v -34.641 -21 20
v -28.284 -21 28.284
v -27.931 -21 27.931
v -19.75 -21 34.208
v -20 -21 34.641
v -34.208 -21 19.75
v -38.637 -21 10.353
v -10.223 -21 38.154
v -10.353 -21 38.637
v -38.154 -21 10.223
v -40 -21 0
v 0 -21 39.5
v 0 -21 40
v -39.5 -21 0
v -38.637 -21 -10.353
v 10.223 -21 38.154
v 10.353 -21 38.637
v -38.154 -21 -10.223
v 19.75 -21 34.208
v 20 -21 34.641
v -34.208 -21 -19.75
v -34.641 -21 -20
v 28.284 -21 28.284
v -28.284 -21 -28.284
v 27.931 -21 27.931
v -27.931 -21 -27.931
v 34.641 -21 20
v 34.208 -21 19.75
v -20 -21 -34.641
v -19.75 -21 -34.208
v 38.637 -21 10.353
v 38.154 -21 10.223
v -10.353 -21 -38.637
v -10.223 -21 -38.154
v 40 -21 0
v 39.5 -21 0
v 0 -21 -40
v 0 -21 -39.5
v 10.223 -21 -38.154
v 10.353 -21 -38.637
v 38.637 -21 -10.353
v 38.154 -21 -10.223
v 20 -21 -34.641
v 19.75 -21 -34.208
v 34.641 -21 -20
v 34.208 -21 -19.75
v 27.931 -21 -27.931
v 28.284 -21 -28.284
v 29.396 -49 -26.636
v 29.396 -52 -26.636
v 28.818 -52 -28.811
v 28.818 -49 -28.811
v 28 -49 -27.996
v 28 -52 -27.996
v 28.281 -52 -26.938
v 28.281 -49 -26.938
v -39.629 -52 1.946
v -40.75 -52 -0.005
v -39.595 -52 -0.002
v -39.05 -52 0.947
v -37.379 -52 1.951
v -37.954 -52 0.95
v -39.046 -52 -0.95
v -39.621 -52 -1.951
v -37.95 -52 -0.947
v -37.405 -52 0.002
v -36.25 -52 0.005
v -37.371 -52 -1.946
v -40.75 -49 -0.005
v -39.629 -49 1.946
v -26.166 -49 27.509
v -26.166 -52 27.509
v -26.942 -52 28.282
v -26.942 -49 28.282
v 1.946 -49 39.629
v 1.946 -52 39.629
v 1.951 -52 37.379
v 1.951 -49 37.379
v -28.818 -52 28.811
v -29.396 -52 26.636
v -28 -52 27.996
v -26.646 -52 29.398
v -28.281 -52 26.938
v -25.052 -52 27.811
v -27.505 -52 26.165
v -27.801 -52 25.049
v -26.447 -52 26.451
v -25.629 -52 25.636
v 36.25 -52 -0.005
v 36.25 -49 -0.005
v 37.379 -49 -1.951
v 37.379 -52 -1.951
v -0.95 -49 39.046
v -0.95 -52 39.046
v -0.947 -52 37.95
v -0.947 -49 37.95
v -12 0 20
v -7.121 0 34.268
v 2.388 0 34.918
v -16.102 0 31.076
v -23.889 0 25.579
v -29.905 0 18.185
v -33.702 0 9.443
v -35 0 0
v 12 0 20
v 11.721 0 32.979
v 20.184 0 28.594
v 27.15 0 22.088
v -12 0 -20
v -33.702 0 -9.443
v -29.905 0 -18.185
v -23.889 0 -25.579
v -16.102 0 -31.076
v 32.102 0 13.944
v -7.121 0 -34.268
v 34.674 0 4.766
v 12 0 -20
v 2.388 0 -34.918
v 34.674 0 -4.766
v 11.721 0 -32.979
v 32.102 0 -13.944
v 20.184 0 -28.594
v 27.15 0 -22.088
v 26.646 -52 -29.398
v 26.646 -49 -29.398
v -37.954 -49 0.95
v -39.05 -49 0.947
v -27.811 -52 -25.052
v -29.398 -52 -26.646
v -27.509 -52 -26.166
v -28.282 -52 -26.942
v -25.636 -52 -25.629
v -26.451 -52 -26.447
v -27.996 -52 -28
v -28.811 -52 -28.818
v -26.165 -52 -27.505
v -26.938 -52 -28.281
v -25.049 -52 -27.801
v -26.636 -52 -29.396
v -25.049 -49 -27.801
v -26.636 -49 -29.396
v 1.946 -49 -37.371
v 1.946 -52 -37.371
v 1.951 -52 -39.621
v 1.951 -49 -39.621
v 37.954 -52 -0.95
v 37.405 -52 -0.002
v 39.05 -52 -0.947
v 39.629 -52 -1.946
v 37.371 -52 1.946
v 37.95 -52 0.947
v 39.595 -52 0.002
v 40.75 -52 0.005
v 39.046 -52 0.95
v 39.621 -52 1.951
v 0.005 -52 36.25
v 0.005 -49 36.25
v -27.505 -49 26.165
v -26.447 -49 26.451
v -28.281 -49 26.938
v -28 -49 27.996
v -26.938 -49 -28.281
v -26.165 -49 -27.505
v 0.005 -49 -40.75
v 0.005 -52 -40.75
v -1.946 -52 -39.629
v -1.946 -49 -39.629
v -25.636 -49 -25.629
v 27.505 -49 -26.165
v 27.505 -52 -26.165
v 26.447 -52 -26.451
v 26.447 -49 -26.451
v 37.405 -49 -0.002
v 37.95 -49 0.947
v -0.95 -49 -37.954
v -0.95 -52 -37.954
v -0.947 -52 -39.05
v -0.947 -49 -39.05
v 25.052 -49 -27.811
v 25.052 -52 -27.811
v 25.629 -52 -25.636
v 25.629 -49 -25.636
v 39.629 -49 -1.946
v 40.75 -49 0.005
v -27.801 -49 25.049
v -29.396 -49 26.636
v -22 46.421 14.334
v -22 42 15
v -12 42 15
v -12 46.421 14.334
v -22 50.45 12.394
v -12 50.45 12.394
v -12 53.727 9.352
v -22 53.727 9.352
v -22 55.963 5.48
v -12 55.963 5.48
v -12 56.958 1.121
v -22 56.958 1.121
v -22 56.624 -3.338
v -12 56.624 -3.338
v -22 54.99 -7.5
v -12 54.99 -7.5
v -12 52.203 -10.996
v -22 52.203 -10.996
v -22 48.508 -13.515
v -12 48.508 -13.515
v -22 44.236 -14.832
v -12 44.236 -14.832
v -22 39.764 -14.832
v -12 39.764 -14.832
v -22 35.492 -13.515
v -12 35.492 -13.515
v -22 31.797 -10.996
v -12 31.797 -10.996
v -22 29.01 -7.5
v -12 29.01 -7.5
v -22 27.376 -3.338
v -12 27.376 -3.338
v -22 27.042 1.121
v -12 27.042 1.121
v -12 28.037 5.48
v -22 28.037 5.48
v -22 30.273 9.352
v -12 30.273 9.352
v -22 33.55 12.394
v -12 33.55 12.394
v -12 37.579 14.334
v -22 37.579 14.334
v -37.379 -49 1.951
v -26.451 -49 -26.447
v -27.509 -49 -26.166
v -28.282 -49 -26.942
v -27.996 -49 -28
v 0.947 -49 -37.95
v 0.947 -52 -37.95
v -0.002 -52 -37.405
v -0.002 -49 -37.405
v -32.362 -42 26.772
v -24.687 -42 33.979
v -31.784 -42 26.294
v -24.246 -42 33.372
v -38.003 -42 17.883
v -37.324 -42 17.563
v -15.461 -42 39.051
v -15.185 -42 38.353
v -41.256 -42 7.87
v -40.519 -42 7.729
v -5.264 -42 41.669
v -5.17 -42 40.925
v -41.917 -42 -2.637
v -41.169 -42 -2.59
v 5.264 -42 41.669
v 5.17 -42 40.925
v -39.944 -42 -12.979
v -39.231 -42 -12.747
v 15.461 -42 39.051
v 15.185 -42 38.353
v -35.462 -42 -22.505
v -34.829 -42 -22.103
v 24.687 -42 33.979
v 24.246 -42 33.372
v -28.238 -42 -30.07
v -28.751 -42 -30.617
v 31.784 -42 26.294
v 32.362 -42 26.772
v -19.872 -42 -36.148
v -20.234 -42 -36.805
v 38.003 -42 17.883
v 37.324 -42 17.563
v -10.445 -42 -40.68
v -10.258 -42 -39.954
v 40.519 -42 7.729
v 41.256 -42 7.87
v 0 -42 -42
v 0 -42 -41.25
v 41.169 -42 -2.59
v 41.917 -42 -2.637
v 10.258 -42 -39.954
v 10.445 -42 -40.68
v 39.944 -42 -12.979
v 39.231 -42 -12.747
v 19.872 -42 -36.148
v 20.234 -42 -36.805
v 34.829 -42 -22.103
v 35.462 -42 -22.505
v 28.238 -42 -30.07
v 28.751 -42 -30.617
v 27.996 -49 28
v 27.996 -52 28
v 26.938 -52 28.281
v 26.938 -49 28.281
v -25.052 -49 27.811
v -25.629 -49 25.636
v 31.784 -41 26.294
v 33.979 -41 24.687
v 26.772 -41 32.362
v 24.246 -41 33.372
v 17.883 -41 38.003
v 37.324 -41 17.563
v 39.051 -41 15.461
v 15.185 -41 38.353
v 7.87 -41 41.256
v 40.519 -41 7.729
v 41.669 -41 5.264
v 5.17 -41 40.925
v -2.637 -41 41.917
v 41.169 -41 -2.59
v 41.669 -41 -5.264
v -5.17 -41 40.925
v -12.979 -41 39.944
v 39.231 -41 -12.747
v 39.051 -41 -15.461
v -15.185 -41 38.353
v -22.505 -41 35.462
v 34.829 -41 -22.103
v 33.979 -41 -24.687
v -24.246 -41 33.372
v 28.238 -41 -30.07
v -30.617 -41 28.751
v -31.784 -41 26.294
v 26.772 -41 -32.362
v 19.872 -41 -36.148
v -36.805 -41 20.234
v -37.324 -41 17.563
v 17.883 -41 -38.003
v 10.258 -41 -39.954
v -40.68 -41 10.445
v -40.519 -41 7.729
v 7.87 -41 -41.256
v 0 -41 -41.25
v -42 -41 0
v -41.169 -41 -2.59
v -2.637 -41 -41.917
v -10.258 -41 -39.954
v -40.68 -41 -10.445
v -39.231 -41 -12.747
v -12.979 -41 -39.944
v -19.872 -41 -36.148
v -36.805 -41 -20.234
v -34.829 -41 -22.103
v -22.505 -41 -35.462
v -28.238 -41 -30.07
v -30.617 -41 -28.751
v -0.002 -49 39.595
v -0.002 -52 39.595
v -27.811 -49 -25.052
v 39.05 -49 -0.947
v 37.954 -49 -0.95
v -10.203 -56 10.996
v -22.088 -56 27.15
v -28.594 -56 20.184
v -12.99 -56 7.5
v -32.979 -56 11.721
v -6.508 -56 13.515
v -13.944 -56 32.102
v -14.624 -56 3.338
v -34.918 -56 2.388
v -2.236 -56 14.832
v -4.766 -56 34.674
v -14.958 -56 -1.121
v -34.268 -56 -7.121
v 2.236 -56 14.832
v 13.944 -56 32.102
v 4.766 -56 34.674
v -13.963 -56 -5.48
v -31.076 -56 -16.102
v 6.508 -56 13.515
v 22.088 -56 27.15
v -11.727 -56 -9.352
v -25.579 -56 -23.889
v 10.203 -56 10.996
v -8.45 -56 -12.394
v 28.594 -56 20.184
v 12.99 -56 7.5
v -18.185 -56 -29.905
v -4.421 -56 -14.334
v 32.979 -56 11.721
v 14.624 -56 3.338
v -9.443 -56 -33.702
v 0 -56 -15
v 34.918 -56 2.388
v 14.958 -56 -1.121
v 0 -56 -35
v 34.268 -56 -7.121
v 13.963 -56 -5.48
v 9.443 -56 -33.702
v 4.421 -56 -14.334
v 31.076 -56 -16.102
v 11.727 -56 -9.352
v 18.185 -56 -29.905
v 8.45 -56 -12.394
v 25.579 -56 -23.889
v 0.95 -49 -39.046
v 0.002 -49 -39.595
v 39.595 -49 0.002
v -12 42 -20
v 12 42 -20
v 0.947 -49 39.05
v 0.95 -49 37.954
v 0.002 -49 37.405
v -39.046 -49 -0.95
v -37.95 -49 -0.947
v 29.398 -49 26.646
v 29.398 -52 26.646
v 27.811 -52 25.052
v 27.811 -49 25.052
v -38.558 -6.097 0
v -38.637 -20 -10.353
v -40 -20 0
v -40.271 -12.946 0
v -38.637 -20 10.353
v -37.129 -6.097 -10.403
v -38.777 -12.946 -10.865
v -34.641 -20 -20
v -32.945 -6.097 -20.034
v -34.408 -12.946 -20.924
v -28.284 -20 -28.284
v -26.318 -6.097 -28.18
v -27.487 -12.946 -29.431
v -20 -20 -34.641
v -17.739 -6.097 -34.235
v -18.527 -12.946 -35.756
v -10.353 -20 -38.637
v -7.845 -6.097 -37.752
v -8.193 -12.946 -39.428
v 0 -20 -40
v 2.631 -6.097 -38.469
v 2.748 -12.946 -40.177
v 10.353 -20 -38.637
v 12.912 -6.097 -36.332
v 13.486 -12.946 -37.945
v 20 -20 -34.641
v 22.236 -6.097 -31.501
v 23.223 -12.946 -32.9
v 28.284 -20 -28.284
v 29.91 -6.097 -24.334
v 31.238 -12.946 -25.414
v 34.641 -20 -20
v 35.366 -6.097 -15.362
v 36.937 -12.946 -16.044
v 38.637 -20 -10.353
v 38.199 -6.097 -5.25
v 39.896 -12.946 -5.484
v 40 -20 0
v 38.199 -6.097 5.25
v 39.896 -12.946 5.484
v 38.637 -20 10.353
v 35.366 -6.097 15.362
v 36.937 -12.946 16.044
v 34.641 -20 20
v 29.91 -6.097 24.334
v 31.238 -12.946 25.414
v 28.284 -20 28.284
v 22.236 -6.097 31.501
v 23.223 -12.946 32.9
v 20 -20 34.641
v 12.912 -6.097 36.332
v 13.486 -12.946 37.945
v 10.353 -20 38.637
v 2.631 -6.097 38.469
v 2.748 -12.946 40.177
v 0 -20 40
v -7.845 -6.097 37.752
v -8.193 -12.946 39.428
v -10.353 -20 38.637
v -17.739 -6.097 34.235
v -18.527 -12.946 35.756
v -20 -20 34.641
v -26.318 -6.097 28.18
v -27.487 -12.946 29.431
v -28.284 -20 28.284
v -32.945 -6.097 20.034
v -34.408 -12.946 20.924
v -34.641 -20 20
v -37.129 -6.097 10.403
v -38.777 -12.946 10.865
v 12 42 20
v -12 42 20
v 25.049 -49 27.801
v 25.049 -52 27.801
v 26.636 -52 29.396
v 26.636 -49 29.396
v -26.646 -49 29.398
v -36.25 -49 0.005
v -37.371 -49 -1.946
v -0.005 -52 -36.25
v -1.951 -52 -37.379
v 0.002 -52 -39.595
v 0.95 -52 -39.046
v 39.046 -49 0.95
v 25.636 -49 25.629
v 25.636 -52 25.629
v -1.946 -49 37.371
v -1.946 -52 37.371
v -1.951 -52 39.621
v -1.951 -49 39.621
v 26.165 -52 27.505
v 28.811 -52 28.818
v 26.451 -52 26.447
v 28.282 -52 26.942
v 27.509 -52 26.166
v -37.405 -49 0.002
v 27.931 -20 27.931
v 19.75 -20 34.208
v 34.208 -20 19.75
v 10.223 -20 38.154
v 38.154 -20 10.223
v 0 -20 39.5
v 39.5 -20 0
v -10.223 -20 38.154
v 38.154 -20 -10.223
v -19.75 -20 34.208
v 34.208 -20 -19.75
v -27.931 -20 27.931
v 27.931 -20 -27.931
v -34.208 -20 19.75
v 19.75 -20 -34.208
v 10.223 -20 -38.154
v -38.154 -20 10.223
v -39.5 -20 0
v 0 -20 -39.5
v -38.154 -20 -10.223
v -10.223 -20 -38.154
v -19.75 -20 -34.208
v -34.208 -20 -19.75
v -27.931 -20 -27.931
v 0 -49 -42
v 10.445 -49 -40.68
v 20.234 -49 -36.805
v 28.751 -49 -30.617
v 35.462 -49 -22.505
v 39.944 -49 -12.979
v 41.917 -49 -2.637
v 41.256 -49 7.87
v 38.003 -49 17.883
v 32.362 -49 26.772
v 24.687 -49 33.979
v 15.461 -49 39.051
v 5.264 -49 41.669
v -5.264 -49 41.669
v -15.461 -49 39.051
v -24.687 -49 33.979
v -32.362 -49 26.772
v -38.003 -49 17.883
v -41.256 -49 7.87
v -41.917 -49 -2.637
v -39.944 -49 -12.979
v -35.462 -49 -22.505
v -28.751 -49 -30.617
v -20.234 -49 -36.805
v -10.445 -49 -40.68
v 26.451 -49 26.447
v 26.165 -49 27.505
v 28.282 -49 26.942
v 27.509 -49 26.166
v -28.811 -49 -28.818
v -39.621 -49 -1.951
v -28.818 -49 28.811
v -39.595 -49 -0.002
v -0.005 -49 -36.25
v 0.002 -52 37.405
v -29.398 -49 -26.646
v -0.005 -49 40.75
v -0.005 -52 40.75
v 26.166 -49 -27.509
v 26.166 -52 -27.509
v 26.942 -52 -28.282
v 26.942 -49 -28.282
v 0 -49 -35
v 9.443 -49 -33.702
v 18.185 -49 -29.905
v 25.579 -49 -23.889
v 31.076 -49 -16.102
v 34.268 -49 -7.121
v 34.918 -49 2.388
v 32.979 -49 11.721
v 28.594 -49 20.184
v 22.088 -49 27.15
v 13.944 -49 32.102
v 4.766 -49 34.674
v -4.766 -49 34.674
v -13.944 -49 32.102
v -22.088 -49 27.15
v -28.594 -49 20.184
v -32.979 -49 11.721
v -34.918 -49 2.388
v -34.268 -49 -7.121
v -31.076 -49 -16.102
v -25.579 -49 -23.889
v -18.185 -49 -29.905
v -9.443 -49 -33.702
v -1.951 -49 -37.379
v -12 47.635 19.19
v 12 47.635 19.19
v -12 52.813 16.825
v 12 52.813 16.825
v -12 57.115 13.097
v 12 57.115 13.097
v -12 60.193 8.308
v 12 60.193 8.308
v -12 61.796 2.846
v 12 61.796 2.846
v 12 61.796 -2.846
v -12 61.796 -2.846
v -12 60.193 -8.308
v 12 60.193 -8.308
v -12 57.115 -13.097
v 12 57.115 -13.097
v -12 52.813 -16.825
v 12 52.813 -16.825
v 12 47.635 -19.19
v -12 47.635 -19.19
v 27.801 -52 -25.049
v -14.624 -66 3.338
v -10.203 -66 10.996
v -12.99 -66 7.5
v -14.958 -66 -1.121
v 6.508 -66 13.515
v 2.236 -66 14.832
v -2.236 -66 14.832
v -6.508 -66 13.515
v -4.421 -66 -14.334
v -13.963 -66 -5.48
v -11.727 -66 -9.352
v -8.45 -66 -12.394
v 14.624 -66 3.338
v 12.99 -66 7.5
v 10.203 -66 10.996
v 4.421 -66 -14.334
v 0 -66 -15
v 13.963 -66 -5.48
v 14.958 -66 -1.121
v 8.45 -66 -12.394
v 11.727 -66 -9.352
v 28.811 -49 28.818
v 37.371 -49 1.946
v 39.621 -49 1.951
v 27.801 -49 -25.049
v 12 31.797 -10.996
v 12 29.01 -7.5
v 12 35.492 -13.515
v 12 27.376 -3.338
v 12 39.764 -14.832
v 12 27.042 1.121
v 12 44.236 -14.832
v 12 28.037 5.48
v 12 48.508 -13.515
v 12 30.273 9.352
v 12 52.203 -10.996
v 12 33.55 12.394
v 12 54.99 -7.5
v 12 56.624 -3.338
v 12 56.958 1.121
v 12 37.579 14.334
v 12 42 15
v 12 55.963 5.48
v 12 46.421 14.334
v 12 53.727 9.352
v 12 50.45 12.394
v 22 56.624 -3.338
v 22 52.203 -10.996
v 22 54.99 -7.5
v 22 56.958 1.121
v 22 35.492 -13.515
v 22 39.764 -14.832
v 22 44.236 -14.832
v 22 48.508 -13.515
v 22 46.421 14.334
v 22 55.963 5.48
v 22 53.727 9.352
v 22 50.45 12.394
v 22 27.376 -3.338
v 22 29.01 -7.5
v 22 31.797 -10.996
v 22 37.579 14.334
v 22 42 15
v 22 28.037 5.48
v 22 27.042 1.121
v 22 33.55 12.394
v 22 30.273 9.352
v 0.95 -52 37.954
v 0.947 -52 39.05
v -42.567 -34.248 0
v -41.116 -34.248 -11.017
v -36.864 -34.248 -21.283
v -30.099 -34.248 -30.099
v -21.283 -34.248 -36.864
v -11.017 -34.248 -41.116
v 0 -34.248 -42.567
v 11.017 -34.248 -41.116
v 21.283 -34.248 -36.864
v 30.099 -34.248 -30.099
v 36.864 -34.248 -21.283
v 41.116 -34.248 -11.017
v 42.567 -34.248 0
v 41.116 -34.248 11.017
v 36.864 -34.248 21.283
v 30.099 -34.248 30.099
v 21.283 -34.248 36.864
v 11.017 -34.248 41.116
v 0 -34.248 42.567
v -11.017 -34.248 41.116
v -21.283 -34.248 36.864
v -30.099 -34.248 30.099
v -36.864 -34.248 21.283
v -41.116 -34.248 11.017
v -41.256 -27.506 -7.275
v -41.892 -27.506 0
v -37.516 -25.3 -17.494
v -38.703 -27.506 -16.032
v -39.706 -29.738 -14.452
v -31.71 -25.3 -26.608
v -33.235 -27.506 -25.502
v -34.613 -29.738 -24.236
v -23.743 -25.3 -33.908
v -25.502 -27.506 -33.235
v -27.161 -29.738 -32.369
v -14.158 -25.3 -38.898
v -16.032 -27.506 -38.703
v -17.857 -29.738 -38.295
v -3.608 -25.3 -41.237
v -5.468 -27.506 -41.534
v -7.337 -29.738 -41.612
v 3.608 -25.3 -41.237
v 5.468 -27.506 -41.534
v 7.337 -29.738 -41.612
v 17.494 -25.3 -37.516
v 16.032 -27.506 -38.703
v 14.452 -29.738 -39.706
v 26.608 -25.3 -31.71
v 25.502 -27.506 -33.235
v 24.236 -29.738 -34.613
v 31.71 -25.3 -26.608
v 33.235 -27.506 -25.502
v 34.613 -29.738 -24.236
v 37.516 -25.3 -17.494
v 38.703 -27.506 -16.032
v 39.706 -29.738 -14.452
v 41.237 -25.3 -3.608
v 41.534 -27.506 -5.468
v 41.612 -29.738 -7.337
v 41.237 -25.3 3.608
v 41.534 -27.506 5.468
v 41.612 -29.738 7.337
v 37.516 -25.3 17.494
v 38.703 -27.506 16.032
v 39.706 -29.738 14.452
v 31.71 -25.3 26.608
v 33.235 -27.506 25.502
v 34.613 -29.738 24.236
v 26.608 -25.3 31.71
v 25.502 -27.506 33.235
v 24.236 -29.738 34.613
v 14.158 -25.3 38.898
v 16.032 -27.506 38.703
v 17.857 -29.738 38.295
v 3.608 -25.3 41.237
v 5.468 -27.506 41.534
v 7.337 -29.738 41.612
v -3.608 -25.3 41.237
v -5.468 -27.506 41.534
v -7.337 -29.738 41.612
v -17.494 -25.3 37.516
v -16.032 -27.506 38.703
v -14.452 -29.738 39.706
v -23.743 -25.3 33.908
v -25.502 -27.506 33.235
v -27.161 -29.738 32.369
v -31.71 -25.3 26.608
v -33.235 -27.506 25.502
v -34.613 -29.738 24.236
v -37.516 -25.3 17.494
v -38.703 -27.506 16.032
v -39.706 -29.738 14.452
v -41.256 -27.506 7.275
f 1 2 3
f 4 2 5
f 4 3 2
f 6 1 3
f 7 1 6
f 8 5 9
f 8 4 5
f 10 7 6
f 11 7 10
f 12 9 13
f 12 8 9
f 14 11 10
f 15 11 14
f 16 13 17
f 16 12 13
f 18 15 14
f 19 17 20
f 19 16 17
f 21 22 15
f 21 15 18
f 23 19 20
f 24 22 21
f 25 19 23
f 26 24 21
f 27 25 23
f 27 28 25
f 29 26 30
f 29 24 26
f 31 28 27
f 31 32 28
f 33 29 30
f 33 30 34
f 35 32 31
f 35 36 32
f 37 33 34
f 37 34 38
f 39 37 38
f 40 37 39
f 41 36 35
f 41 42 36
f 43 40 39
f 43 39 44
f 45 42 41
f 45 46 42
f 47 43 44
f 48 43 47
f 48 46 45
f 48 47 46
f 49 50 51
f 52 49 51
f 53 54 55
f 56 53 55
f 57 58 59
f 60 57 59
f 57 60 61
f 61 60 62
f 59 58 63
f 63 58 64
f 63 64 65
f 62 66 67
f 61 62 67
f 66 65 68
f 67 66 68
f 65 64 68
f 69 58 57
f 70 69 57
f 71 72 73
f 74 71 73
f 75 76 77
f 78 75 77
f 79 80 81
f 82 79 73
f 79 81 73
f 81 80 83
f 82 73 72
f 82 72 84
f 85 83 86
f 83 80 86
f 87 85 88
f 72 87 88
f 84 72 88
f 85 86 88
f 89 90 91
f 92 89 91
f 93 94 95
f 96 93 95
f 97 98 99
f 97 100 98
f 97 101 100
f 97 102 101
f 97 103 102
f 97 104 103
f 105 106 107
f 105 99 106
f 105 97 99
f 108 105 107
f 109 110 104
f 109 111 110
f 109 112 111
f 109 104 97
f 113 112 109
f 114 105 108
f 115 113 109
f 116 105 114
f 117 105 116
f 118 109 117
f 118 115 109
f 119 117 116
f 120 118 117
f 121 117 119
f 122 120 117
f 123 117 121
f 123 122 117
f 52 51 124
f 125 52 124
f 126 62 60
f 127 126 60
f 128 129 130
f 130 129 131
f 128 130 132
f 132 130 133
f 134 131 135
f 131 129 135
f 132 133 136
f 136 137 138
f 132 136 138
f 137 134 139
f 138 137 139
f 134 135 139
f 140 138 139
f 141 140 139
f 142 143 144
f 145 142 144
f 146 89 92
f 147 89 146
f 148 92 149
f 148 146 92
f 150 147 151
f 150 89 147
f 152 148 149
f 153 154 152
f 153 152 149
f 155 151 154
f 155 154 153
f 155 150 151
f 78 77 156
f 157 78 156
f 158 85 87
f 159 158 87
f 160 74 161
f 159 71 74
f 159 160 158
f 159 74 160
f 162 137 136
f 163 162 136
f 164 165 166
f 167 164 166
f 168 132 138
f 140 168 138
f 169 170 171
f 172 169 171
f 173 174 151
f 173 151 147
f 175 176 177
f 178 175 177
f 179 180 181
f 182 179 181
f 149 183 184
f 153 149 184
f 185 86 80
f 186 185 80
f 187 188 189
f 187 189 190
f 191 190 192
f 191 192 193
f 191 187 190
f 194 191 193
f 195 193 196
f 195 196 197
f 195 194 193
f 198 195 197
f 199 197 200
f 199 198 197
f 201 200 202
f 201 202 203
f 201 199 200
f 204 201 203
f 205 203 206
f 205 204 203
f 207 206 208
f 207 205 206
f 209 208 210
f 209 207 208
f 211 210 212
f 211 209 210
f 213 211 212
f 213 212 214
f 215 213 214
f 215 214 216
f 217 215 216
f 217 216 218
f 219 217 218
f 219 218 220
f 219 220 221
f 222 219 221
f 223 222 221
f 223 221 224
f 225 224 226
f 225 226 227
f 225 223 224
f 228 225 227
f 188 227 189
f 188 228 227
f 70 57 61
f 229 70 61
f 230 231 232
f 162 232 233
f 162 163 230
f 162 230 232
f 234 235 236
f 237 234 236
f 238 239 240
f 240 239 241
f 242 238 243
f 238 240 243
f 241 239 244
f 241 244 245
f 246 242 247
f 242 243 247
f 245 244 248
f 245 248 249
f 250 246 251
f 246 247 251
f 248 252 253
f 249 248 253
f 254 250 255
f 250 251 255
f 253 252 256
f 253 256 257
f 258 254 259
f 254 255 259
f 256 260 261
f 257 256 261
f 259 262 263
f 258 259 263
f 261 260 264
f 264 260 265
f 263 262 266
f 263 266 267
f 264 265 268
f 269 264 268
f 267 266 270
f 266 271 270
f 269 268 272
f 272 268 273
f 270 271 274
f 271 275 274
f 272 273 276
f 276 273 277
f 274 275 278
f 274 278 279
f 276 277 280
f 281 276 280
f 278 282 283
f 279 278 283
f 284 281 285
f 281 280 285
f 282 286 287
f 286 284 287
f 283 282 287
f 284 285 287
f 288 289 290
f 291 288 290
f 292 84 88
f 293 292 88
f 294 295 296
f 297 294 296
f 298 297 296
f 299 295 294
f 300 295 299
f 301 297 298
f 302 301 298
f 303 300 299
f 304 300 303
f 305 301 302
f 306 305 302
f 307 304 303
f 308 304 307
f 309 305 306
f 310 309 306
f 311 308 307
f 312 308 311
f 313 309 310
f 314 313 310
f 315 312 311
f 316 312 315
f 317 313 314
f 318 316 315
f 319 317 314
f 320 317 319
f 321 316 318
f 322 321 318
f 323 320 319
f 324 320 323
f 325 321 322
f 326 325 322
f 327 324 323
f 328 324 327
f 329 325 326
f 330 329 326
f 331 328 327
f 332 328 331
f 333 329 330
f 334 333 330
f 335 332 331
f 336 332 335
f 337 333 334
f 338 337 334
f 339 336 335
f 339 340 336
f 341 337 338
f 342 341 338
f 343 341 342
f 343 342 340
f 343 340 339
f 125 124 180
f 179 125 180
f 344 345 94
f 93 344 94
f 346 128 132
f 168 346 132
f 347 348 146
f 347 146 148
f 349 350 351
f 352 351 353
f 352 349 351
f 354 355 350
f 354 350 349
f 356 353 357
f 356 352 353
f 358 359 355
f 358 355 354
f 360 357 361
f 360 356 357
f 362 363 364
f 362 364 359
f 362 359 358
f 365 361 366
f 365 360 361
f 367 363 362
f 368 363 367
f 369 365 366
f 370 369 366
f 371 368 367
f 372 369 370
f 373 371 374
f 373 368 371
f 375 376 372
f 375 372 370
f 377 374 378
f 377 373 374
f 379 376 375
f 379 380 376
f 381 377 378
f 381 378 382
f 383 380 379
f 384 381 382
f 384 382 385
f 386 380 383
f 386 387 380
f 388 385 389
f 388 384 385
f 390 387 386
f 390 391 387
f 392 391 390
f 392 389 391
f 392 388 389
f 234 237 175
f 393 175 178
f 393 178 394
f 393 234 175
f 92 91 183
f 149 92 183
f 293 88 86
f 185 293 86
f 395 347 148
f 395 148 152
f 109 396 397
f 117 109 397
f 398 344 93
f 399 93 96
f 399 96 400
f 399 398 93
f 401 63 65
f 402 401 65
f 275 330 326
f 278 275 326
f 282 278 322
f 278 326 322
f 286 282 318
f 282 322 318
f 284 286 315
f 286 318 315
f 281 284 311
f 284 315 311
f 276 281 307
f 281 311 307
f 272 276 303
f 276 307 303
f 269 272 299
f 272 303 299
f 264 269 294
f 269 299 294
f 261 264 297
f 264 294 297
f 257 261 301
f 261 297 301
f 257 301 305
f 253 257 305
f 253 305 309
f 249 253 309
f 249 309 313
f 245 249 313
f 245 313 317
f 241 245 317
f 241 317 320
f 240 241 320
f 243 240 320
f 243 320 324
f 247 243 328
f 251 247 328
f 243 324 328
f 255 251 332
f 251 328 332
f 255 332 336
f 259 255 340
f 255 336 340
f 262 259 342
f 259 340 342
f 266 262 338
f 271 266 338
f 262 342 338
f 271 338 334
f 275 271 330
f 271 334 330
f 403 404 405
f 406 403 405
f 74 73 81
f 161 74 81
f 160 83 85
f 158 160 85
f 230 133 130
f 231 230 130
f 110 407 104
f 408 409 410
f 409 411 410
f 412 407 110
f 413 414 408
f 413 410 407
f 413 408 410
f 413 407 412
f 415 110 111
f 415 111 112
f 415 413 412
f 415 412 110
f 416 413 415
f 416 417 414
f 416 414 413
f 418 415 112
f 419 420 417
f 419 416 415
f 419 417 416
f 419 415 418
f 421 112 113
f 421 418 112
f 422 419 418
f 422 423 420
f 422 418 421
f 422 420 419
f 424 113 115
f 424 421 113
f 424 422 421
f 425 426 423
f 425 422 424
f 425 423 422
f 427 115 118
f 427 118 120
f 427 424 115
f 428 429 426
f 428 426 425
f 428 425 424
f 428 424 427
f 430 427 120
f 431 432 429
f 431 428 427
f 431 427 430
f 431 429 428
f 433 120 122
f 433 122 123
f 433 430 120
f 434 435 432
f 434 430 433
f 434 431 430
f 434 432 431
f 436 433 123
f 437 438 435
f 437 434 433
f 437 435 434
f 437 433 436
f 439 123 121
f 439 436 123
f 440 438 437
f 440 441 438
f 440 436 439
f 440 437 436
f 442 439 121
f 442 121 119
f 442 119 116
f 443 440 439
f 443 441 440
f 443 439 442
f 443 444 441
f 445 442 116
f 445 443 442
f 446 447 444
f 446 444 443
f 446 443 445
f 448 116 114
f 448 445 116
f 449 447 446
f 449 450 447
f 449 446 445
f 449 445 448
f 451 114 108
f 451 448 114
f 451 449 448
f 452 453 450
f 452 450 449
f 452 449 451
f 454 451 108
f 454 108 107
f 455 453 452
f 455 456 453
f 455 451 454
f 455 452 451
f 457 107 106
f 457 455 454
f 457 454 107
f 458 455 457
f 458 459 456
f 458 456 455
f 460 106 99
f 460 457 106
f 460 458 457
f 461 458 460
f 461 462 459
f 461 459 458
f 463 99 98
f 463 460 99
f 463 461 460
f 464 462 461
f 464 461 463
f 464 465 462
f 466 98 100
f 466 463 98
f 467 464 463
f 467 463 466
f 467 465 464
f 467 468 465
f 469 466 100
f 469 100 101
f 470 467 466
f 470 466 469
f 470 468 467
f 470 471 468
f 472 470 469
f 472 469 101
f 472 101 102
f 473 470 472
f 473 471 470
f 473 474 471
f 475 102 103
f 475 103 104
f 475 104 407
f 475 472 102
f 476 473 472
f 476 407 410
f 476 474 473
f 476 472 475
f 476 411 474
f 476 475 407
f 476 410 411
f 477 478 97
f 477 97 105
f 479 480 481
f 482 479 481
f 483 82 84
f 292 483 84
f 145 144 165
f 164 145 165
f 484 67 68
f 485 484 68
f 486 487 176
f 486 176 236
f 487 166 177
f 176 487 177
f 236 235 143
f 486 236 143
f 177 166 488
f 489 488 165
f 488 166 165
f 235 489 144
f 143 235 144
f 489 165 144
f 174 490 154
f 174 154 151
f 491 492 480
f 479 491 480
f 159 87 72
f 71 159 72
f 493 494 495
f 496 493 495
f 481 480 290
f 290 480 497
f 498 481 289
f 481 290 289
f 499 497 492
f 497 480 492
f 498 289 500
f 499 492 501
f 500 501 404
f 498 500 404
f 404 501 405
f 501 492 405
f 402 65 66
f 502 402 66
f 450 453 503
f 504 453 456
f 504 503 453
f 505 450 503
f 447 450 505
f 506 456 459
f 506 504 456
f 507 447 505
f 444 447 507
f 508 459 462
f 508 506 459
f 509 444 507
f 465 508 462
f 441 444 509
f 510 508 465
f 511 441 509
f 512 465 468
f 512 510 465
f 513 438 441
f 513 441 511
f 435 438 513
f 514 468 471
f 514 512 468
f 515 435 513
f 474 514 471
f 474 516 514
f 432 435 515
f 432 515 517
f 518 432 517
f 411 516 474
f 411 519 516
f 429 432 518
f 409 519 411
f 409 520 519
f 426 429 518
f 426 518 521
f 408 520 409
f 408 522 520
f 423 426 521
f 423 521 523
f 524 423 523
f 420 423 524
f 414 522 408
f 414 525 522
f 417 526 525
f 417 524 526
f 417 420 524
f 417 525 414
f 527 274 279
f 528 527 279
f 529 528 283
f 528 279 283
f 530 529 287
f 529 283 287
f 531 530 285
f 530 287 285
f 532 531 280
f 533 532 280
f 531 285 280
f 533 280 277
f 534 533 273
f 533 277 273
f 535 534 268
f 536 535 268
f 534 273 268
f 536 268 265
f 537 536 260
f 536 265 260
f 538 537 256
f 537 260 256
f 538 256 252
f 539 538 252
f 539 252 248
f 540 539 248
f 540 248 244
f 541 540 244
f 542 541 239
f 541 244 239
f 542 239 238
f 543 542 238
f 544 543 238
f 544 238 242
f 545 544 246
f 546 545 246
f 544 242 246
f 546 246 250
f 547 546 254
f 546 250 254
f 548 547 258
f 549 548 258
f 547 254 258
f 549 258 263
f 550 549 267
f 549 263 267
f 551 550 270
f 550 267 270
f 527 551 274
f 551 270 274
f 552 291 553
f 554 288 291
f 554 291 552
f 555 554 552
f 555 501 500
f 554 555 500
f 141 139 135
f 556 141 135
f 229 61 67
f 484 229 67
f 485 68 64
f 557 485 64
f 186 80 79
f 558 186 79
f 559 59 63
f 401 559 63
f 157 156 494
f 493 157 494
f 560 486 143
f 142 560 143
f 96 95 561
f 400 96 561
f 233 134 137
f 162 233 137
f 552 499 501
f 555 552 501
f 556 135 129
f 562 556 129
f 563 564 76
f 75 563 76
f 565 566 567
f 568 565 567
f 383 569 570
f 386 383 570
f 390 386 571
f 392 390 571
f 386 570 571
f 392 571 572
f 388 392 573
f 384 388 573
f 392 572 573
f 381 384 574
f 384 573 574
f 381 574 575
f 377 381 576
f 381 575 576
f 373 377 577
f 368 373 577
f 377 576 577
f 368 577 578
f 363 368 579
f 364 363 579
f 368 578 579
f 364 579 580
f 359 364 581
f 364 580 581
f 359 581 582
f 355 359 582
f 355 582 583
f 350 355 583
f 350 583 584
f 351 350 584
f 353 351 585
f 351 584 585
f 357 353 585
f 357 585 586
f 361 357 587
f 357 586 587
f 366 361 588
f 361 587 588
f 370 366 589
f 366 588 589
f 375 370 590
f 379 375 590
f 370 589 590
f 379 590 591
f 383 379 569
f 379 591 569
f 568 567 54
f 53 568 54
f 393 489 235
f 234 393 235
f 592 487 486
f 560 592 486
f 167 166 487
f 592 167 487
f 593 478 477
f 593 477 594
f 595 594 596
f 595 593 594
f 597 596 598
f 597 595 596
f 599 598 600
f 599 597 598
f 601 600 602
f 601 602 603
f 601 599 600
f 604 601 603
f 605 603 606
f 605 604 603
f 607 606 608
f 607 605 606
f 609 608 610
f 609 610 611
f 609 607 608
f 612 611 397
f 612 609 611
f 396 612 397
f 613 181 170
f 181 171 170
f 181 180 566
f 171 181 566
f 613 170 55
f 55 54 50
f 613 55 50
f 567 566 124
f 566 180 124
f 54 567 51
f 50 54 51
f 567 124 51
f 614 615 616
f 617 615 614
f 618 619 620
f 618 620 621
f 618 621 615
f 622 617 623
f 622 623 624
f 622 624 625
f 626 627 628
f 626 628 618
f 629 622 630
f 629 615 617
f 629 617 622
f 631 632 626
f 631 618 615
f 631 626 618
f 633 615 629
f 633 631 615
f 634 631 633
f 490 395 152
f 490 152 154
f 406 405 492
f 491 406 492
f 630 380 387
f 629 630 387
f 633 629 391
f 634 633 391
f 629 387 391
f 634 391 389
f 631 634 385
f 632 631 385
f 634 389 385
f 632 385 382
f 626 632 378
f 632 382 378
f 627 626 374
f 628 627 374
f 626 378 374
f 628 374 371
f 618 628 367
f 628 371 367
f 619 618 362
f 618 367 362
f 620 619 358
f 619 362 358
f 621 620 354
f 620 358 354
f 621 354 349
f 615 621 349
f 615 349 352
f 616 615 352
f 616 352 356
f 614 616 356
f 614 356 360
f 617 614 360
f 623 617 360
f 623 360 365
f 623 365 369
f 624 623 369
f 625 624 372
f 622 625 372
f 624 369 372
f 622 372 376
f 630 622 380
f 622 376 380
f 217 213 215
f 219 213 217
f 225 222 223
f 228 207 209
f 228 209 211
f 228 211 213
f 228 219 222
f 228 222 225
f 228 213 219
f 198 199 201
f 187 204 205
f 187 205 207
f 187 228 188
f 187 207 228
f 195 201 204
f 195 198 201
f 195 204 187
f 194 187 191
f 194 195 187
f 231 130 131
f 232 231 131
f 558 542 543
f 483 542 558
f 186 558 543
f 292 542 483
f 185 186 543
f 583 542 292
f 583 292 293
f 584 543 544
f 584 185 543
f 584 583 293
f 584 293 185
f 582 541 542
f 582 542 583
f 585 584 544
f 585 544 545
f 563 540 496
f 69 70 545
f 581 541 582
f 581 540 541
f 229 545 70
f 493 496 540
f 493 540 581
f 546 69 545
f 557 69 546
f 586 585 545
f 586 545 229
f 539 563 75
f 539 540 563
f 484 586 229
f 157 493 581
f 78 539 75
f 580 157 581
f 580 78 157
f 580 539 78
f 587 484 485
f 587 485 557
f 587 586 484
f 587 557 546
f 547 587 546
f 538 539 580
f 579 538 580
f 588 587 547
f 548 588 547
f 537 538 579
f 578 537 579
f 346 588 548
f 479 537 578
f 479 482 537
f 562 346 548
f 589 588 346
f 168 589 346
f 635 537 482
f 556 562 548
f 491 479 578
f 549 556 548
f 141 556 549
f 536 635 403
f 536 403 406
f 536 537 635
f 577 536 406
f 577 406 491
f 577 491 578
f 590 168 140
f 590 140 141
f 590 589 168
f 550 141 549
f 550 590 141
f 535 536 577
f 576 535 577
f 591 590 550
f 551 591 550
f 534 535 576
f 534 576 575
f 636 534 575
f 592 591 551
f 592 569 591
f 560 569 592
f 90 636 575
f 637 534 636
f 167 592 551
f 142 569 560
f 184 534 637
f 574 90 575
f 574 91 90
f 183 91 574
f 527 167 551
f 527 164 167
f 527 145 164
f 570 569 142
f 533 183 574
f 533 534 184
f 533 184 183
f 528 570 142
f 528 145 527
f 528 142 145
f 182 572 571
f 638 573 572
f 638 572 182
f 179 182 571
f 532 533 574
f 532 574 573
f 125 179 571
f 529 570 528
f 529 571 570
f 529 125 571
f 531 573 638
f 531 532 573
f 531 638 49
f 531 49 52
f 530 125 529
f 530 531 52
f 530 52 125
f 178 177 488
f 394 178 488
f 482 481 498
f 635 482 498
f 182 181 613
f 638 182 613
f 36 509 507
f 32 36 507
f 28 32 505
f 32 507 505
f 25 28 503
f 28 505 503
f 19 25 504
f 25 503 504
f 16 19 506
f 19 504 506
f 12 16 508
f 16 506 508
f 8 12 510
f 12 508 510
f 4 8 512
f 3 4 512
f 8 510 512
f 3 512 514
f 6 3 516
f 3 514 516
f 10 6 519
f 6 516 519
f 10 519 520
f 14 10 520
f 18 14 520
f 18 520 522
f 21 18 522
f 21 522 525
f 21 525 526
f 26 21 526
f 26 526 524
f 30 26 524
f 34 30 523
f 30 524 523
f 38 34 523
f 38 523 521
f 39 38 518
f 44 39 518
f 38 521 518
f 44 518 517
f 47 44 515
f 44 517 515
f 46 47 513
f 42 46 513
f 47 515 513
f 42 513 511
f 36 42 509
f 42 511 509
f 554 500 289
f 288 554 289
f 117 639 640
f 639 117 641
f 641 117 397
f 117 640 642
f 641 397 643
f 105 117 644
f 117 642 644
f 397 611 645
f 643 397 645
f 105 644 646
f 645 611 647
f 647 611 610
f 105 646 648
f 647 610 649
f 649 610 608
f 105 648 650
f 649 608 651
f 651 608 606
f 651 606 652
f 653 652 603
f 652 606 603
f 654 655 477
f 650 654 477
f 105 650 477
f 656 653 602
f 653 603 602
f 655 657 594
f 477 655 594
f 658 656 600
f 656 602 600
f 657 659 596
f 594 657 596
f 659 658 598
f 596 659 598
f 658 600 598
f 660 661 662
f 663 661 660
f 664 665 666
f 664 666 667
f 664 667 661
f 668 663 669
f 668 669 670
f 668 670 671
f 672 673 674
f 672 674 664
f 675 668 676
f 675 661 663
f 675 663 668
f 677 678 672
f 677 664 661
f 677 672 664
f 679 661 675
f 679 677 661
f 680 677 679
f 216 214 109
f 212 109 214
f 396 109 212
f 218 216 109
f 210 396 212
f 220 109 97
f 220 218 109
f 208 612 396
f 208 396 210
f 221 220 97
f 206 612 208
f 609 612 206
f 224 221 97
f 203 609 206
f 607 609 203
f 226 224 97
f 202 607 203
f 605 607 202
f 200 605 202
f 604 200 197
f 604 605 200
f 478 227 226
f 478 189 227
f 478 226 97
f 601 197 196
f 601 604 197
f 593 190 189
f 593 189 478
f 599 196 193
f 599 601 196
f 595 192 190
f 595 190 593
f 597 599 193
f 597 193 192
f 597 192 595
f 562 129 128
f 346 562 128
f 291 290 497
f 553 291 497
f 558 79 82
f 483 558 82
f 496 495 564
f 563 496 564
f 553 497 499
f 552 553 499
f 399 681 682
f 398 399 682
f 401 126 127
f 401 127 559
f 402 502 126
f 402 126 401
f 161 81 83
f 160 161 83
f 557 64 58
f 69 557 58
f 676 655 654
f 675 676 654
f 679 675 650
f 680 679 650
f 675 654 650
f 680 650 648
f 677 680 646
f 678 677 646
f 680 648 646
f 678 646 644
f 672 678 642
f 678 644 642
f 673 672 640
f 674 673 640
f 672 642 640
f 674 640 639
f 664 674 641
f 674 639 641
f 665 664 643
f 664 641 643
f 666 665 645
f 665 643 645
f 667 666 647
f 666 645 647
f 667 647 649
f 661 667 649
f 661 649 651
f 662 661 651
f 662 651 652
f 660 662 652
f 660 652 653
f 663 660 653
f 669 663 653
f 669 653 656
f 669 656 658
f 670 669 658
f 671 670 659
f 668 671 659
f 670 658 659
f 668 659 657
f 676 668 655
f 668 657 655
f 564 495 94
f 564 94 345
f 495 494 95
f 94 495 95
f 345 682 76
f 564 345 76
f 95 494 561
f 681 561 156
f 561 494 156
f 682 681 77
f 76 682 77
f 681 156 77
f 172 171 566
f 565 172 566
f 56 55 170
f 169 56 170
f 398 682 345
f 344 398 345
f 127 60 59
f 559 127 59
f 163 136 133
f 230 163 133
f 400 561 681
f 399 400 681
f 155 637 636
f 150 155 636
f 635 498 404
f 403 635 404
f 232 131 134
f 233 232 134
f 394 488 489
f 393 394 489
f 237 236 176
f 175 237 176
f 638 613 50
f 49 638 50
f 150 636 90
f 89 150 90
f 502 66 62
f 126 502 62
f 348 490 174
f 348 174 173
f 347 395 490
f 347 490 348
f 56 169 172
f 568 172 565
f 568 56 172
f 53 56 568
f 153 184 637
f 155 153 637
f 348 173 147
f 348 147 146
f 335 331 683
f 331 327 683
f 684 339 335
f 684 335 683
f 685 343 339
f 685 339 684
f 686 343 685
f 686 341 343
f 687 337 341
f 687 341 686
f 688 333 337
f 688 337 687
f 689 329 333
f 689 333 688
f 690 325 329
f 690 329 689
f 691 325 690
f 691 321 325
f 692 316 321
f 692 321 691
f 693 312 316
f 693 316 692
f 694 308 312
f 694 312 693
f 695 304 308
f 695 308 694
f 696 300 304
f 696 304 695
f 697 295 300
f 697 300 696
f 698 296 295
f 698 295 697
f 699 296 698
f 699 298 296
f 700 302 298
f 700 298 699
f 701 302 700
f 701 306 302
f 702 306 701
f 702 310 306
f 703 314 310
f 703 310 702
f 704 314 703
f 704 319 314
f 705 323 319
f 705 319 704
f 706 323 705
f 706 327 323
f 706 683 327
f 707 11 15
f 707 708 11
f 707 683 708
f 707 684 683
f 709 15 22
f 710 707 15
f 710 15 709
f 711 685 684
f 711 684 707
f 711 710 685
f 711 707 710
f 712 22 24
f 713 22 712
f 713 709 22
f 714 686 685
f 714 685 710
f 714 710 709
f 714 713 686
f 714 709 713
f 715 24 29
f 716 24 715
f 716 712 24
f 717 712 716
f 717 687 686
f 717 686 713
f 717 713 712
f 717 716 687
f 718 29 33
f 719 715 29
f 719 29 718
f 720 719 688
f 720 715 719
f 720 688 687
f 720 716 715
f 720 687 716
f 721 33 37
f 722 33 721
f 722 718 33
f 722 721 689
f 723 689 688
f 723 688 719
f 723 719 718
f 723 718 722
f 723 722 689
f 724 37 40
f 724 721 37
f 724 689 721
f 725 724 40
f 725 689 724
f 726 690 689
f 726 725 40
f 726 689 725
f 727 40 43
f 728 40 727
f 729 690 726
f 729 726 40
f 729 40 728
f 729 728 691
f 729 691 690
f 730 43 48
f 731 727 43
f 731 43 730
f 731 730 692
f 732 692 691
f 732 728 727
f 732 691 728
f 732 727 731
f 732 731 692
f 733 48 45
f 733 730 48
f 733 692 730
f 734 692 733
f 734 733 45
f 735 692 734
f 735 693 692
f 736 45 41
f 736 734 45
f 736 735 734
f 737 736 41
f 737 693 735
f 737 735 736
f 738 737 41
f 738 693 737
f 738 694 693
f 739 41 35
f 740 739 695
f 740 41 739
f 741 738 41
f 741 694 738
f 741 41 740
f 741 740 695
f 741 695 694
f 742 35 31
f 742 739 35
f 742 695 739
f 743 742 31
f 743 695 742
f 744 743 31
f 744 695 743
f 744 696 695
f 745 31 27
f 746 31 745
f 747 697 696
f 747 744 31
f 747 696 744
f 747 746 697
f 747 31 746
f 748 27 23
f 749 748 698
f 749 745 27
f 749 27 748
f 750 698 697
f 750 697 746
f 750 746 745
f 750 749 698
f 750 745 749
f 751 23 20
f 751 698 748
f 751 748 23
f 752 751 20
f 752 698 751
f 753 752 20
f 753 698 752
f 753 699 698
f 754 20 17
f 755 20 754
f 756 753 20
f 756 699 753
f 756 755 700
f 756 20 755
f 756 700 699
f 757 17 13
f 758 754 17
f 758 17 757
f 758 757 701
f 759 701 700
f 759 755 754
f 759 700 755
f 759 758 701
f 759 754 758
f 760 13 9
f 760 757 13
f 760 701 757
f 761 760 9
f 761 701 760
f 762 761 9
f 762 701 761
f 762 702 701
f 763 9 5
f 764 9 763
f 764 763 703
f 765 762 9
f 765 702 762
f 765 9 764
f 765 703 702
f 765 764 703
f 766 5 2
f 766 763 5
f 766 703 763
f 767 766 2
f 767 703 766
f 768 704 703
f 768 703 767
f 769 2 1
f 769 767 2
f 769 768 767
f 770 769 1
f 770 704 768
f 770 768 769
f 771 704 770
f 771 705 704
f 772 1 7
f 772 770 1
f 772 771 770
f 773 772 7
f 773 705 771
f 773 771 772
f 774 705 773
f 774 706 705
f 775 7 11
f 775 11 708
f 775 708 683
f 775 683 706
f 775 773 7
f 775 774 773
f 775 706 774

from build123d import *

# Parameters (mm, degrees)
ESQUISSE2_R                  = 39.5
BOSS_EXTRU_1_DEPTH           = 1
ESQUISSE4_R                  = 41.25
BOSS_EXTRU_2_DEPTH           = 1
ESQUISSE5_R                  = 42
BOSS_EXTRU_3_DEPTH           = 7
ESQUISSE6_R                  = 35
BOSS_EXTRU_4_DEPTH           = 7
BOSS_EXTRU_7_DEPTH           = 3
R_P_TITION_START             = -52
R_P_TITION_CIRCULAIRE1_DEPTH = 3
ESQUISSE8_R                  = 15
BOSS_EXTRU_8_DEPTH           = 10
ESQUISSE9_W                  = 24
ESQUISSE9_H                  = 40
BOSS_EXTRU_9_DEPTH           = 42
BOSS_EXTRU_10_DEPTH          = 24
ESQUISSE11_R                 = 15
BOSS_EXTRU_11_DEPTH          = 10
BOSS_EXTRU_12_START          = 10
ESQUISSE12_R                 = 15
BOSS_EXTRU_12_DEPTH          = 10


# Read off the part's stored shape, not the designer's step: Répétition circulaire1
with BuildPart() as part:
    # Esquisse1 → Révolution1 (revolve)
    with BuildSketch(Plane.XY):
        with BuildLine():
            Line((0, 0), (-35, 0))
            ThreePointArc((-35, 0), (-39.657515479, -9.46062113), (-40, -20))
            Line((-40, -20), (0, -20))
            Line((0, -20), (0, 0))
        make_face()
    revolve(axis=Axis((0, 0, 0), (0, -1, 0)))

    # Esquisse2 → Boss.-Extru.1 (add)
    with BuildSketch(Plane.XZ.offset(20)):
        Circle(ESQUISSE2_R)
    extrude(amount=BOSS_EXTRU_1_DEPTH)

    # Esquisse3 → Révolution2 (revolve)
    with BuildSketch(Plane(origin=(0, 0, 0), x_dir=(0, 0, -1), z_dir=(1, 0, 0)), mode=Mode.PRIVATE) as r_volution2_sk:
        with BuildLine():
            Line((0, -21), (-40, -21))
            ThreePointArc((-40, -21), (-42.384109041, -30.861589096), (-42, -41))
            Line((-42, -41), (0, -41))
            Line((0, -41), (0, -21))
        make_face()
    revolve(r_volution2_sk.sketch.rotate(Axis((0, -21, 0), (0, -1, 0)), 90), axis=Axis((0, -21, 0), (0, -1, 0)))

    # Esquisse4 → Boss.-Extru.2 (add)
    with BuildSketch(Plane.XZ.offset(41)):
        with Locations(Location((0, 0, 0), (0, 0, 270))):
            Circle(ESQUISSE4_R)
    extrude(amount=BOSS_EXTRU_2_DEPTH)

    # Esquisse5 → Boss.-Extru.3 (add)
    with BuildSketch(Plane.XZ.offset(42)):
        with Locations(Location((0, 0, 0), (0, 0, 270))):
            Circle(ESQUISSE5_R)
    extrude(amount=BOSS_EXTRU_3_DEPTH)

    # Esquisse6 → Boss.-Extru.4 (add)
    with BuildSketch(Plane.XZ.offset(49)):
        with Locations(Location((0, 0, 0), (0, 0, 270))):
            Circle(ESQUISSE6_R)
    extrude(amount=BOSS_EXTRU_4_DEPTH)

    # Esquisse7 → Boss.-Extru.7 (add)
    with BuildSketch(Plane.XZ.offset(49)):
        Polygon((39.629367086, -1.94603582), (40.75, 0.005042677), (39.620632914, 1.951078497), (37.370632914, 1.94603582), (36.25, -0.005042677), (37.379367086, -1.951078497), align=None)
        Polygon((39.045525279, 0.94978706), (37.950222917, 0.94733228), (37.404697638, -0.00245478), (37.954474721, -0.94978706), (39.049777083, -0.94733228), (39.595302362, 0.00245478), align=None, mode=Mode.SUBTRACT)
    extrude(amount=BOSS_EXTRU_7_DEPTH)

    # Répétition circulaire1 outline → Répétition circulaire1 (add)
    # profile 1 of 7: a face of its own
    with BuildSketch(Plane(origin=(0, 0, 0), x_dir=(1, 0, 0), z_dir=(0, 1, 0)).offset(R_P_TITION_START)):
        Polygon((29.398249326, -26.646139076), (27.810824779, -25.051583107), (25.636186529, -25.629055107), (25.048972826, -27.801083076), (26.636397373, -29.395639044), (28.811035623, -28.818167044), align=None)
        Polygon((28.282227258, -26.9424971), (27.996371011, -27.999842595), (26.937754829, -28.28095657), (26.164994893, -27.504725051), (26.45085114, -26.447379557), (27.509467323, -26.166265581), align=None, mode=Mode.SUBTRACT)
    # profile 2 of 7: a face of its own
    with BuildSketch(Plane(origin=(0, 0, 0), x_dir=(1, 0, 0), z_dir=(0, 1, 0)).offset(R_P_TITION_START)):
        Polygon((26.646139076, 29.398249326), (25.051583107, 27.810824779), (25.629055107, 25.636186529), (27.801083076, 25.048972826), (29.395639044, 26.636397373), (28.818167044, 28.811035623), align=None)
        Polygon((26.9424971, 28.282227258), (27.999842595, 27.996371011), (28.28095657, 26.937754829), (27.504725051, 26.164994893), (26.447379557, 26.45085114), (26.166265581, 27.509467323), align=None, mode=Mode.SUBTRACT)
    # profile 3 of 7: a face of its own
    with BuildSketch(Plane(origin=(0, 0, 0), x_dir=(1, 0, 0), z_dir=(0, 1, 0)).offset(R_P_TITION_START)):
        Polygon((-1.94603582, 39.629367086), (-1.951078497, 37.379367086), (-0.005042677, 36.25), (1.94603582, 37.370632914), (1.951078497, 39.620632914), (0.005042677, 40.75), align=None)
        Polygon((-0.94733228, 39.049777083), (0.00245478, 39.595302362), (0.94978706, 39.045525279), (0.94733228, 37.950222917), (-0.00245478, 37.404697638), (-0.94978706, 37.954474721), align=None, mode=Mode.SUBTRACT)
    # profile 4 of 7: a face of its own
    with BuildSketch(Plane(origin=(0, 0, 0), x_dir=(1, 0, 0), z_dir=(0, 1, 0)).offset(R_P_TITION_START)):
        Polygon((-29.398249326, 26.646139076), (-27.810824779, 25.051583107), (-25.636186529, 25.629055107), (-25.048972826, 27.801083076), (-26.636397373, 29.395639044), (-28.811035623, 28.818167044), align=None)
        Polygon((-28.282227258, 26.9424971), (-27.996371011, 27.999842595), (-26.937754829, 28.28095657), (-26.164994893, 27.504725051), (-26.45085114, 26.447379557), (-27.509467323, 26.166265581), align=None, mode=Mode.SUBTRACT)
    # profile 5 of 7: a face of its own
    with BuildSketch(Plane(origin=(0, 0, 0), x_dir=(1, 0, 0), z_dir=(0, 1, 0)).offset(R_P_TITION_START)):
        Polygon((-39.629367086, -1.94603582), (-37.379367086, -1.951078497), (-36.25, -0.005042677), (-37.370632914, 1.94603582), (-39.620632914, 1.951078497), (-40.75, 0.005042677), align=None)
        Polygon((-39.049777083, -0.94733228), (-39.595302362, 0.00245478), (-39.045525279, 0.94978706), (-37.950222917, 0.94733228), (-37.404697638, -0.00245478), (-37.954474721, -0.94978706), align=None, mode=Mode.SUBTRACT)
    # profile 6 of 7: a face of its own
    with BuildSketch(Plane(origin=(0, 0, 0), x_dir=(1, 0, 0), z_dir=(0, 1, 0)).offset(R_P_TITION_START)):
        Polygon((-26.646139076, -29.398249326), (-25.051583107, -27.810824779), (-25.629055107, -25.636186529), (-27.801083076, -25.048972826), (-29.395639044, -26.636397373), (-28.818167044, -28.811035623), align=None)
        Polygon((-26.9424971, -28.282227258), (-27.999842595, -27.996371011), (-28.28095657, -26.937754829), (-27.504725051, -26.164994893), (-26.447379557, -26.45085114), (-26.166265581, -27.509467323), align=None, mode=Mode.SUBTRACT)
    # profile 7 of 7: a face of its own
    with BuildSketch(Plane(origin=(0, 0, 0), x_dir=(1, 0, 0), z_dir=(0, 1, 0)).offset(R_P_TITION_START)):
        Polygon((1.94603582, -39.629367086), (1.951078497, -37.379367086), (0.005042677, -36.25), (-1.94603582, -37.370632914), (-1.951078497, -39.620632914), (-0.005042677, -40.75), align=None)
        Polygon((0.94733228, -39.049777083), (-0.00245478, -39.595302362), (-0.94978706, -39.045525279), (-0.94733228, -37.950222917), (0.00245478, -37.404697638), (0.94978706, -37.954474721), align=None, mode=Mode.SUBTRACT)
    extrude(amount=R_P_TITION_CIRCULAIRE1_DEPTH)

    # Esquisse8 → Boss.-Extru.8 (add)
    with BuildSketch(Plane.XZ.offset(56)):
        with Locations(Location((0, 0, 0), (0, 0, 270))):
            Circle(ESQUISSE8_R)
    extrude(amount=BOSS_EXTRU_8_DEPTH)

    # Esquisse9 → Boss.-Extru.9 (add)
    with BuildSketch(Plane(origin=(0, 0, 0), x_dir=(1, 0, 0), z_dir=(0, 1, 0))):
        Rectangle(ESQUISSE9_W, ESQUISSE9_H)
    extrude(amount=BOSS_EXTRU_9_DEPTH)

    # Esquisse10 → Boss.-Extru.10 (add)
    with BuildSketch(Plane.ZY.offset(12)):
        with BuildLine():
            Line((-20, 42), (20, 42))
            ThreePointArc((20, 42), (0, 62), (-20, 42))
        make_face()
    extrude(amount=-BOSS_EXTRU_10_DEPTH)

    # Esquisse11 → Boss.-Extru.11 (add)
    with BuildSketch(Plane(origin=(12, 0, 0), x_dir=(0, 0, -1), z_dir=(1, 0, 0))):
        with Locations(Location((0, 42, 0), (0, 0, 180))):
            Circle(ESQUISSE11_R)
    extrude(amount=BOSS_EXTRU_11_DEPTH)

    # Esquisse12 → Boss.-Extru.12 (add)
    with BuildSketch(Plane.ZY.offset(12).offset(BOSS_EXTRU_12_START)):
        with Locations((0, 42)):
            Circle(ESQUISSE12_R)
    extrude(amount=-BOSS_EXTRU_12_DEPTH)


solid = part.part
